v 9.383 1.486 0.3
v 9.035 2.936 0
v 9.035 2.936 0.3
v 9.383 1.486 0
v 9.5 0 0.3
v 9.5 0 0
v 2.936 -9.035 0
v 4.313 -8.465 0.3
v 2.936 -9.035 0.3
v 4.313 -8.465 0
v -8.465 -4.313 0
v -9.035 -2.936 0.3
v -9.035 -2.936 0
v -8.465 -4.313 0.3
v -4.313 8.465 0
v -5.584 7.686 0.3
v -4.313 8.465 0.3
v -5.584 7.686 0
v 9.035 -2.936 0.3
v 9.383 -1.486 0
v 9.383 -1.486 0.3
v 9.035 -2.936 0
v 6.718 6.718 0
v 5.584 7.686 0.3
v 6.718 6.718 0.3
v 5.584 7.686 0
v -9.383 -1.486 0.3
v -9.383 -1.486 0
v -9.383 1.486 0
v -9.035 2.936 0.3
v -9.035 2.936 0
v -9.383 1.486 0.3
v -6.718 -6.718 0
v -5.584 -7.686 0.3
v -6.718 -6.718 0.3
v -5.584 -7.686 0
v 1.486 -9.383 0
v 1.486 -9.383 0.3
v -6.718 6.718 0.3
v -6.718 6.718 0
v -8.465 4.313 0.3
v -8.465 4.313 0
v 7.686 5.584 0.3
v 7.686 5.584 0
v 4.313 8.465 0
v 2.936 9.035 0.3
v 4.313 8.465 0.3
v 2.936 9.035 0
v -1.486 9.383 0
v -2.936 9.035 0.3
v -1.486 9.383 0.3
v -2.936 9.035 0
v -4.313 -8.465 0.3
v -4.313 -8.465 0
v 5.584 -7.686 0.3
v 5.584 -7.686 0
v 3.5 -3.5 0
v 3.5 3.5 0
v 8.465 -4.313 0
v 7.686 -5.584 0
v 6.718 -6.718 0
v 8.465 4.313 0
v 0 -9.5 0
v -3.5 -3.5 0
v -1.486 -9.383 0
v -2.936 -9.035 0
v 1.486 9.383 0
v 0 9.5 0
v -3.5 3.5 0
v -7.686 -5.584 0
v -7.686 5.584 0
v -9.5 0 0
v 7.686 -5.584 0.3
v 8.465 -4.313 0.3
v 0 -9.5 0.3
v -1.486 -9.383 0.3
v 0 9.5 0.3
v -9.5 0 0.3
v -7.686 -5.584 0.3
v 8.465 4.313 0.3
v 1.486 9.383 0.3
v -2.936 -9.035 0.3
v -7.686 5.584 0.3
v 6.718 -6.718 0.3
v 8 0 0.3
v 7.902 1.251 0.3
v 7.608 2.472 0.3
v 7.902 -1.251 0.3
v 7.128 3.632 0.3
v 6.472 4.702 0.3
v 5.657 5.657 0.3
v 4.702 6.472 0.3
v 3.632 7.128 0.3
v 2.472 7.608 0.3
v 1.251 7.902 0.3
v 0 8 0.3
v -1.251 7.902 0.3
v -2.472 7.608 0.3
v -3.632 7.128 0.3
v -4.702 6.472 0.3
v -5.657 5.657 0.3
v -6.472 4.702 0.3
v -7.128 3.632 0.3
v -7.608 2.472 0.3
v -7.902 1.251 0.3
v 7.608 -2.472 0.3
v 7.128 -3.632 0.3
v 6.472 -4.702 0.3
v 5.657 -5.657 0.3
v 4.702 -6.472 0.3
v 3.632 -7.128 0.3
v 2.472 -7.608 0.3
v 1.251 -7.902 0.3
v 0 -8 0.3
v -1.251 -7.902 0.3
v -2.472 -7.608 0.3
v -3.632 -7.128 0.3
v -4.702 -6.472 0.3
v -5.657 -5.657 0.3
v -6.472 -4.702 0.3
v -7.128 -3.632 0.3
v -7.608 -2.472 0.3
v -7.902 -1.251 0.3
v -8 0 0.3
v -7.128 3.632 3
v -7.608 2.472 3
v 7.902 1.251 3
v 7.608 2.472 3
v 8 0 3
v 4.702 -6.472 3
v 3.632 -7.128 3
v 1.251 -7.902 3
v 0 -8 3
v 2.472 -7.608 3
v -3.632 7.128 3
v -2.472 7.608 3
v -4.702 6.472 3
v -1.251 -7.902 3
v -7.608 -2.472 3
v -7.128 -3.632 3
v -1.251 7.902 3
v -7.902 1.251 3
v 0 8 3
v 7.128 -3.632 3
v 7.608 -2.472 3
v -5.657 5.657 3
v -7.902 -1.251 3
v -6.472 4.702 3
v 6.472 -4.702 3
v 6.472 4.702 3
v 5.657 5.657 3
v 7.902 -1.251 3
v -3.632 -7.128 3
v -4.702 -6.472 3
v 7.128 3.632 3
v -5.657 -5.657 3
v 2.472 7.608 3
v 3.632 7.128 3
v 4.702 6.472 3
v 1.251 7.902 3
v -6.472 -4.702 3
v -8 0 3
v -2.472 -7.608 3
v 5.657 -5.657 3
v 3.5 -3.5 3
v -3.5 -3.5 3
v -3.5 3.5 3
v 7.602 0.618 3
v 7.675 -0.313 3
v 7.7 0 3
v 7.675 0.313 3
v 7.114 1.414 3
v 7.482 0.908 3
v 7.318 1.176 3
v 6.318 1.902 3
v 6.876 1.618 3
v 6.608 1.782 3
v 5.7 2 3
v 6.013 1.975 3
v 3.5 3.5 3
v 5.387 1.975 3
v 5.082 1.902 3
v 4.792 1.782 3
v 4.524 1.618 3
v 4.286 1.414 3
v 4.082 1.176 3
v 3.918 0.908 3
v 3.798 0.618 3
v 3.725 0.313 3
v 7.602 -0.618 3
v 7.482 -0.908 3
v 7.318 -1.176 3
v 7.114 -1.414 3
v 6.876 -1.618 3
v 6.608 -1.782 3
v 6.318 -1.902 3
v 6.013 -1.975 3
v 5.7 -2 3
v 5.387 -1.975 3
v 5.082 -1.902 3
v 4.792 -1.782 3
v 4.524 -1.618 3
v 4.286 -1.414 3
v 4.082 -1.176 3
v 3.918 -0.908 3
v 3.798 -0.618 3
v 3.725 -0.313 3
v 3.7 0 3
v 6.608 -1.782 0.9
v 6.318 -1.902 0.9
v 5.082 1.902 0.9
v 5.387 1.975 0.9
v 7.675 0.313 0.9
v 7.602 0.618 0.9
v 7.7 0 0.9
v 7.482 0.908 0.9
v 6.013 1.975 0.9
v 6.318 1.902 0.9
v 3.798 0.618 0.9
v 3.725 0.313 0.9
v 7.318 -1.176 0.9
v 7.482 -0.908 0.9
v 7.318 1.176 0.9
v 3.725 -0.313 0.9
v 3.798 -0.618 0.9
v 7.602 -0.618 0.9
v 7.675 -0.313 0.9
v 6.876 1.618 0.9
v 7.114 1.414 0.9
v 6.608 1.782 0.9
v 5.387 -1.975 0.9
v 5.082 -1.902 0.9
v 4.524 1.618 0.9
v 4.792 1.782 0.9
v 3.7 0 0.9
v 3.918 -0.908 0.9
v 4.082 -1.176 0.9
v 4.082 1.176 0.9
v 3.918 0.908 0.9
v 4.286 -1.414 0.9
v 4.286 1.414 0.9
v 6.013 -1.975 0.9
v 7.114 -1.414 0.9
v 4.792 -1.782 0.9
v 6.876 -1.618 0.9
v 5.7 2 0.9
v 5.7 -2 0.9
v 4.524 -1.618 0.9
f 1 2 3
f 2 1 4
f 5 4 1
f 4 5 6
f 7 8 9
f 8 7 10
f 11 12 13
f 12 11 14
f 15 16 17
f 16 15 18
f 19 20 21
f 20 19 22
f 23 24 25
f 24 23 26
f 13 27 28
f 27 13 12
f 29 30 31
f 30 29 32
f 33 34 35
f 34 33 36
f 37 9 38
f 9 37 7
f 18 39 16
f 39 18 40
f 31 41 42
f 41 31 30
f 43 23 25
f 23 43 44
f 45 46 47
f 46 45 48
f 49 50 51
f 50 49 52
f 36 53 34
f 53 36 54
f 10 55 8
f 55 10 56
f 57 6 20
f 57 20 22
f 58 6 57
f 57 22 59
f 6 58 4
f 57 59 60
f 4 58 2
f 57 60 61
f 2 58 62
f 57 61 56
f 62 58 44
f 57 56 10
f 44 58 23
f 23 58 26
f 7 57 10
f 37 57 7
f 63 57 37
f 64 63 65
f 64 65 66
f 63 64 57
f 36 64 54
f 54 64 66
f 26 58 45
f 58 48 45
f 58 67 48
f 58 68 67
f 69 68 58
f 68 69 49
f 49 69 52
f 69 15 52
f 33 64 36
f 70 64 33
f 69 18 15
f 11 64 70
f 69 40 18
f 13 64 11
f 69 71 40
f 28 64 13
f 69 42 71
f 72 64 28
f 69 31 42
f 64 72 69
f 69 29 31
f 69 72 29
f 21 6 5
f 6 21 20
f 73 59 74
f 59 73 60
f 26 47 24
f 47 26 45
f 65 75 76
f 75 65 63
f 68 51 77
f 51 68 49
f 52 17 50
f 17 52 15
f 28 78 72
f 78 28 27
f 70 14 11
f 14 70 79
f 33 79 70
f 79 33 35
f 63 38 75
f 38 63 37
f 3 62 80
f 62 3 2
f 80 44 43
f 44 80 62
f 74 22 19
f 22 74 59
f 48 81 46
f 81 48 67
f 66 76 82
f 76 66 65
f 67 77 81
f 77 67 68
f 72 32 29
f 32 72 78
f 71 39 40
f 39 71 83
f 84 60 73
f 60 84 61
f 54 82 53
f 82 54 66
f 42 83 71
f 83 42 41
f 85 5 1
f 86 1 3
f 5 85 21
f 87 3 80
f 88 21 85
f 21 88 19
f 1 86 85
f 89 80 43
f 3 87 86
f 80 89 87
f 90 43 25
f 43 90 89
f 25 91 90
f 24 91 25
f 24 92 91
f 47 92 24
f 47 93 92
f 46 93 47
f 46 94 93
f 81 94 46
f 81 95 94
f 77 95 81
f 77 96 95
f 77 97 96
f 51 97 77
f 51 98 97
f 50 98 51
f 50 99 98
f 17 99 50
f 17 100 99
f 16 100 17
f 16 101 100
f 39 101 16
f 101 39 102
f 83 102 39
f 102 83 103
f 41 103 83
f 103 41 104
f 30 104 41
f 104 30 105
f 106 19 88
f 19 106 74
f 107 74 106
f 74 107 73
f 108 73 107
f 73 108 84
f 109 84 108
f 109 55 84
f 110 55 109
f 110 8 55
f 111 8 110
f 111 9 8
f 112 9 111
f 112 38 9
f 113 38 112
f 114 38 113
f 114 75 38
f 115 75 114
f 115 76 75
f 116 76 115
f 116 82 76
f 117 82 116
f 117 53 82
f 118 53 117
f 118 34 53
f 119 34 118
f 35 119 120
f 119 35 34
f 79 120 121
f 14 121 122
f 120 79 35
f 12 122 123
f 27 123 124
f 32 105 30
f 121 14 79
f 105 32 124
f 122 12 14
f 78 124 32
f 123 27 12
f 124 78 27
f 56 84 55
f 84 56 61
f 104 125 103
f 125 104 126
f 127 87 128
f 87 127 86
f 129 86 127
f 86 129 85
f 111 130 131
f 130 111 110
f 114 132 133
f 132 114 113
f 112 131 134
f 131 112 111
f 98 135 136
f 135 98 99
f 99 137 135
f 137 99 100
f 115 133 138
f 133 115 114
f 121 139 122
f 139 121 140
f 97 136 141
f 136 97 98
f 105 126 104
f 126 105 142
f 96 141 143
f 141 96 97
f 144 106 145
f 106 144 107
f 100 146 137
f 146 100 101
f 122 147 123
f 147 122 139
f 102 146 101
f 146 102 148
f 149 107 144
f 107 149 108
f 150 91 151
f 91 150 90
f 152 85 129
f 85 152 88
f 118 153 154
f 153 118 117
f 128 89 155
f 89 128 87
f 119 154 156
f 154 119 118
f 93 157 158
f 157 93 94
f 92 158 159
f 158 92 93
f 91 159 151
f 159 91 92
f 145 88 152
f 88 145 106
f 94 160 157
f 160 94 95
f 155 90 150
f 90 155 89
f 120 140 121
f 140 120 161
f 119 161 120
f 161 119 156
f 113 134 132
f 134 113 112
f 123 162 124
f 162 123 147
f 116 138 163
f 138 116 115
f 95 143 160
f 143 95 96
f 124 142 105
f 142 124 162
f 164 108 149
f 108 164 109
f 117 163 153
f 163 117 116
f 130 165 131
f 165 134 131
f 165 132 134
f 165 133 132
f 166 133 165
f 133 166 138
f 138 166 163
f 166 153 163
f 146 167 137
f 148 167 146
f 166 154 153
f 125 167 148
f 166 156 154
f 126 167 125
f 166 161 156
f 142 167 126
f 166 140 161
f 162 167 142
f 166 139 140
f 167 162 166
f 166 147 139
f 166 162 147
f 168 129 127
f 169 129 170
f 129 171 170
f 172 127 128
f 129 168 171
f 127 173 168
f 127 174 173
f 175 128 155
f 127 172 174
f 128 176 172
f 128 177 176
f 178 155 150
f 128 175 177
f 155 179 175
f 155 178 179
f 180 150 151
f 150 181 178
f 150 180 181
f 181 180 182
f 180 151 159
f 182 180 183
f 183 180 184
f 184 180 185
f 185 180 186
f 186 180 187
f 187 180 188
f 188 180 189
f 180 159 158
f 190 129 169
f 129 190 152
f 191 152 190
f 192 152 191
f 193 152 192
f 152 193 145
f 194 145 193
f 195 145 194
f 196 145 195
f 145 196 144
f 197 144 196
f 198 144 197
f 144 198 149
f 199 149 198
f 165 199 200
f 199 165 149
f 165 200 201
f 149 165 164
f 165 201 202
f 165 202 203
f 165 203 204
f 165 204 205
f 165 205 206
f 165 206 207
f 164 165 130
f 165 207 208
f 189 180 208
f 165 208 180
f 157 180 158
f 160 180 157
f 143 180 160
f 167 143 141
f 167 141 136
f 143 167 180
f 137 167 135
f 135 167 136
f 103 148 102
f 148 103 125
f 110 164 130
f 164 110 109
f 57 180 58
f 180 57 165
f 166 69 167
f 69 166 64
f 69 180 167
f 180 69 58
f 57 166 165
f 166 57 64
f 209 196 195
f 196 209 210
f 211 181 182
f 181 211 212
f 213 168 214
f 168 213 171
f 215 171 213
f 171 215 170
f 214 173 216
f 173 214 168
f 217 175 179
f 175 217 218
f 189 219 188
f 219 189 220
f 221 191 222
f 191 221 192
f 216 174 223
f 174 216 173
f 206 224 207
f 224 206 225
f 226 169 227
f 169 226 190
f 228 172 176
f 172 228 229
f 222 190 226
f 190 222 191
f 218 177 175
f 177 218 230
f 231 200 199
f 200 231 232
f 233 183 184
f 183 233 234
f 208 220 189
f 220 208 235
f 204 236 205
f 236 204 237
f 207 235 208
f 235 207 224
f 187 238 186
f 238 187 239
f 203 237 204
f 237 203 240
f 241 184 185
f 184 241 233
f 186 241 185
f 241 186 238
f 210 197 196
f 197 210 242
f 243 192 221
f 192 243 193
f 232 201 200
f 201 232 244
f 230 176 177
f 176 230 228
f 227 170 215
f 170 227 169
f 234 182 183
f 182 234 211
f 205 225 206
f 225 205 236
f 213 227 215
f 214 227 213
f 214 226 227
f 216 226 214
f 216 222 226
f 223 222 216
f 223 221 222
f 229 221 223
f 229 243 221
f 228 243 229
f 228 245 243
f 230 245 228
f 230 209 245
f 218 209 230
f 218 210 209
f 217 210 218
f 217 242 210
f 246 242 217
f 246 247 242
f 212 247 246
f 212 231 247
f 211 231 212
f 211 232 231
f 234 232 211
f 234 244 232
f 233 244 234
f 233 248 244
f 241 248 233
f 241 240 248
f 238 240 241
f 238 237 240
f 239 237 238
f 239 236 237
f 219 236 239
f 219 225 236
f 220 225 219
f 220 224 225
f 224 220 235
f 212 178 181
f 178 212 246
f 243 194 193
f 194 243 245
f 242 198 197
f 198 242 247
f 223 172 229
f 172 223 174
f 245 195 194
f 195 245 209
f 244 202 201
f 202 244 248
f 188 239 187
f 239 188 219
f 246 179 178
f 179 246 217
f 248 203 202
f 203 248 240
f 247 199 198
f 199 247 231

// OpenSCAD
difference() {
	union() {
		cylinder(h=0.3, r=9.5, $fn=40);
		translate([0,0, 0.3]) {
			cylinder(h=2.7, r=8, $fn=40);
		}
	}
	translate([-3.5, -3.5, 0]) {
		cube([7, 7, 3]);
	}
	translate([5.7, 0, 0.9]) {
		cylinder(h=2.1, r=2, $fn=40);
	}
}
